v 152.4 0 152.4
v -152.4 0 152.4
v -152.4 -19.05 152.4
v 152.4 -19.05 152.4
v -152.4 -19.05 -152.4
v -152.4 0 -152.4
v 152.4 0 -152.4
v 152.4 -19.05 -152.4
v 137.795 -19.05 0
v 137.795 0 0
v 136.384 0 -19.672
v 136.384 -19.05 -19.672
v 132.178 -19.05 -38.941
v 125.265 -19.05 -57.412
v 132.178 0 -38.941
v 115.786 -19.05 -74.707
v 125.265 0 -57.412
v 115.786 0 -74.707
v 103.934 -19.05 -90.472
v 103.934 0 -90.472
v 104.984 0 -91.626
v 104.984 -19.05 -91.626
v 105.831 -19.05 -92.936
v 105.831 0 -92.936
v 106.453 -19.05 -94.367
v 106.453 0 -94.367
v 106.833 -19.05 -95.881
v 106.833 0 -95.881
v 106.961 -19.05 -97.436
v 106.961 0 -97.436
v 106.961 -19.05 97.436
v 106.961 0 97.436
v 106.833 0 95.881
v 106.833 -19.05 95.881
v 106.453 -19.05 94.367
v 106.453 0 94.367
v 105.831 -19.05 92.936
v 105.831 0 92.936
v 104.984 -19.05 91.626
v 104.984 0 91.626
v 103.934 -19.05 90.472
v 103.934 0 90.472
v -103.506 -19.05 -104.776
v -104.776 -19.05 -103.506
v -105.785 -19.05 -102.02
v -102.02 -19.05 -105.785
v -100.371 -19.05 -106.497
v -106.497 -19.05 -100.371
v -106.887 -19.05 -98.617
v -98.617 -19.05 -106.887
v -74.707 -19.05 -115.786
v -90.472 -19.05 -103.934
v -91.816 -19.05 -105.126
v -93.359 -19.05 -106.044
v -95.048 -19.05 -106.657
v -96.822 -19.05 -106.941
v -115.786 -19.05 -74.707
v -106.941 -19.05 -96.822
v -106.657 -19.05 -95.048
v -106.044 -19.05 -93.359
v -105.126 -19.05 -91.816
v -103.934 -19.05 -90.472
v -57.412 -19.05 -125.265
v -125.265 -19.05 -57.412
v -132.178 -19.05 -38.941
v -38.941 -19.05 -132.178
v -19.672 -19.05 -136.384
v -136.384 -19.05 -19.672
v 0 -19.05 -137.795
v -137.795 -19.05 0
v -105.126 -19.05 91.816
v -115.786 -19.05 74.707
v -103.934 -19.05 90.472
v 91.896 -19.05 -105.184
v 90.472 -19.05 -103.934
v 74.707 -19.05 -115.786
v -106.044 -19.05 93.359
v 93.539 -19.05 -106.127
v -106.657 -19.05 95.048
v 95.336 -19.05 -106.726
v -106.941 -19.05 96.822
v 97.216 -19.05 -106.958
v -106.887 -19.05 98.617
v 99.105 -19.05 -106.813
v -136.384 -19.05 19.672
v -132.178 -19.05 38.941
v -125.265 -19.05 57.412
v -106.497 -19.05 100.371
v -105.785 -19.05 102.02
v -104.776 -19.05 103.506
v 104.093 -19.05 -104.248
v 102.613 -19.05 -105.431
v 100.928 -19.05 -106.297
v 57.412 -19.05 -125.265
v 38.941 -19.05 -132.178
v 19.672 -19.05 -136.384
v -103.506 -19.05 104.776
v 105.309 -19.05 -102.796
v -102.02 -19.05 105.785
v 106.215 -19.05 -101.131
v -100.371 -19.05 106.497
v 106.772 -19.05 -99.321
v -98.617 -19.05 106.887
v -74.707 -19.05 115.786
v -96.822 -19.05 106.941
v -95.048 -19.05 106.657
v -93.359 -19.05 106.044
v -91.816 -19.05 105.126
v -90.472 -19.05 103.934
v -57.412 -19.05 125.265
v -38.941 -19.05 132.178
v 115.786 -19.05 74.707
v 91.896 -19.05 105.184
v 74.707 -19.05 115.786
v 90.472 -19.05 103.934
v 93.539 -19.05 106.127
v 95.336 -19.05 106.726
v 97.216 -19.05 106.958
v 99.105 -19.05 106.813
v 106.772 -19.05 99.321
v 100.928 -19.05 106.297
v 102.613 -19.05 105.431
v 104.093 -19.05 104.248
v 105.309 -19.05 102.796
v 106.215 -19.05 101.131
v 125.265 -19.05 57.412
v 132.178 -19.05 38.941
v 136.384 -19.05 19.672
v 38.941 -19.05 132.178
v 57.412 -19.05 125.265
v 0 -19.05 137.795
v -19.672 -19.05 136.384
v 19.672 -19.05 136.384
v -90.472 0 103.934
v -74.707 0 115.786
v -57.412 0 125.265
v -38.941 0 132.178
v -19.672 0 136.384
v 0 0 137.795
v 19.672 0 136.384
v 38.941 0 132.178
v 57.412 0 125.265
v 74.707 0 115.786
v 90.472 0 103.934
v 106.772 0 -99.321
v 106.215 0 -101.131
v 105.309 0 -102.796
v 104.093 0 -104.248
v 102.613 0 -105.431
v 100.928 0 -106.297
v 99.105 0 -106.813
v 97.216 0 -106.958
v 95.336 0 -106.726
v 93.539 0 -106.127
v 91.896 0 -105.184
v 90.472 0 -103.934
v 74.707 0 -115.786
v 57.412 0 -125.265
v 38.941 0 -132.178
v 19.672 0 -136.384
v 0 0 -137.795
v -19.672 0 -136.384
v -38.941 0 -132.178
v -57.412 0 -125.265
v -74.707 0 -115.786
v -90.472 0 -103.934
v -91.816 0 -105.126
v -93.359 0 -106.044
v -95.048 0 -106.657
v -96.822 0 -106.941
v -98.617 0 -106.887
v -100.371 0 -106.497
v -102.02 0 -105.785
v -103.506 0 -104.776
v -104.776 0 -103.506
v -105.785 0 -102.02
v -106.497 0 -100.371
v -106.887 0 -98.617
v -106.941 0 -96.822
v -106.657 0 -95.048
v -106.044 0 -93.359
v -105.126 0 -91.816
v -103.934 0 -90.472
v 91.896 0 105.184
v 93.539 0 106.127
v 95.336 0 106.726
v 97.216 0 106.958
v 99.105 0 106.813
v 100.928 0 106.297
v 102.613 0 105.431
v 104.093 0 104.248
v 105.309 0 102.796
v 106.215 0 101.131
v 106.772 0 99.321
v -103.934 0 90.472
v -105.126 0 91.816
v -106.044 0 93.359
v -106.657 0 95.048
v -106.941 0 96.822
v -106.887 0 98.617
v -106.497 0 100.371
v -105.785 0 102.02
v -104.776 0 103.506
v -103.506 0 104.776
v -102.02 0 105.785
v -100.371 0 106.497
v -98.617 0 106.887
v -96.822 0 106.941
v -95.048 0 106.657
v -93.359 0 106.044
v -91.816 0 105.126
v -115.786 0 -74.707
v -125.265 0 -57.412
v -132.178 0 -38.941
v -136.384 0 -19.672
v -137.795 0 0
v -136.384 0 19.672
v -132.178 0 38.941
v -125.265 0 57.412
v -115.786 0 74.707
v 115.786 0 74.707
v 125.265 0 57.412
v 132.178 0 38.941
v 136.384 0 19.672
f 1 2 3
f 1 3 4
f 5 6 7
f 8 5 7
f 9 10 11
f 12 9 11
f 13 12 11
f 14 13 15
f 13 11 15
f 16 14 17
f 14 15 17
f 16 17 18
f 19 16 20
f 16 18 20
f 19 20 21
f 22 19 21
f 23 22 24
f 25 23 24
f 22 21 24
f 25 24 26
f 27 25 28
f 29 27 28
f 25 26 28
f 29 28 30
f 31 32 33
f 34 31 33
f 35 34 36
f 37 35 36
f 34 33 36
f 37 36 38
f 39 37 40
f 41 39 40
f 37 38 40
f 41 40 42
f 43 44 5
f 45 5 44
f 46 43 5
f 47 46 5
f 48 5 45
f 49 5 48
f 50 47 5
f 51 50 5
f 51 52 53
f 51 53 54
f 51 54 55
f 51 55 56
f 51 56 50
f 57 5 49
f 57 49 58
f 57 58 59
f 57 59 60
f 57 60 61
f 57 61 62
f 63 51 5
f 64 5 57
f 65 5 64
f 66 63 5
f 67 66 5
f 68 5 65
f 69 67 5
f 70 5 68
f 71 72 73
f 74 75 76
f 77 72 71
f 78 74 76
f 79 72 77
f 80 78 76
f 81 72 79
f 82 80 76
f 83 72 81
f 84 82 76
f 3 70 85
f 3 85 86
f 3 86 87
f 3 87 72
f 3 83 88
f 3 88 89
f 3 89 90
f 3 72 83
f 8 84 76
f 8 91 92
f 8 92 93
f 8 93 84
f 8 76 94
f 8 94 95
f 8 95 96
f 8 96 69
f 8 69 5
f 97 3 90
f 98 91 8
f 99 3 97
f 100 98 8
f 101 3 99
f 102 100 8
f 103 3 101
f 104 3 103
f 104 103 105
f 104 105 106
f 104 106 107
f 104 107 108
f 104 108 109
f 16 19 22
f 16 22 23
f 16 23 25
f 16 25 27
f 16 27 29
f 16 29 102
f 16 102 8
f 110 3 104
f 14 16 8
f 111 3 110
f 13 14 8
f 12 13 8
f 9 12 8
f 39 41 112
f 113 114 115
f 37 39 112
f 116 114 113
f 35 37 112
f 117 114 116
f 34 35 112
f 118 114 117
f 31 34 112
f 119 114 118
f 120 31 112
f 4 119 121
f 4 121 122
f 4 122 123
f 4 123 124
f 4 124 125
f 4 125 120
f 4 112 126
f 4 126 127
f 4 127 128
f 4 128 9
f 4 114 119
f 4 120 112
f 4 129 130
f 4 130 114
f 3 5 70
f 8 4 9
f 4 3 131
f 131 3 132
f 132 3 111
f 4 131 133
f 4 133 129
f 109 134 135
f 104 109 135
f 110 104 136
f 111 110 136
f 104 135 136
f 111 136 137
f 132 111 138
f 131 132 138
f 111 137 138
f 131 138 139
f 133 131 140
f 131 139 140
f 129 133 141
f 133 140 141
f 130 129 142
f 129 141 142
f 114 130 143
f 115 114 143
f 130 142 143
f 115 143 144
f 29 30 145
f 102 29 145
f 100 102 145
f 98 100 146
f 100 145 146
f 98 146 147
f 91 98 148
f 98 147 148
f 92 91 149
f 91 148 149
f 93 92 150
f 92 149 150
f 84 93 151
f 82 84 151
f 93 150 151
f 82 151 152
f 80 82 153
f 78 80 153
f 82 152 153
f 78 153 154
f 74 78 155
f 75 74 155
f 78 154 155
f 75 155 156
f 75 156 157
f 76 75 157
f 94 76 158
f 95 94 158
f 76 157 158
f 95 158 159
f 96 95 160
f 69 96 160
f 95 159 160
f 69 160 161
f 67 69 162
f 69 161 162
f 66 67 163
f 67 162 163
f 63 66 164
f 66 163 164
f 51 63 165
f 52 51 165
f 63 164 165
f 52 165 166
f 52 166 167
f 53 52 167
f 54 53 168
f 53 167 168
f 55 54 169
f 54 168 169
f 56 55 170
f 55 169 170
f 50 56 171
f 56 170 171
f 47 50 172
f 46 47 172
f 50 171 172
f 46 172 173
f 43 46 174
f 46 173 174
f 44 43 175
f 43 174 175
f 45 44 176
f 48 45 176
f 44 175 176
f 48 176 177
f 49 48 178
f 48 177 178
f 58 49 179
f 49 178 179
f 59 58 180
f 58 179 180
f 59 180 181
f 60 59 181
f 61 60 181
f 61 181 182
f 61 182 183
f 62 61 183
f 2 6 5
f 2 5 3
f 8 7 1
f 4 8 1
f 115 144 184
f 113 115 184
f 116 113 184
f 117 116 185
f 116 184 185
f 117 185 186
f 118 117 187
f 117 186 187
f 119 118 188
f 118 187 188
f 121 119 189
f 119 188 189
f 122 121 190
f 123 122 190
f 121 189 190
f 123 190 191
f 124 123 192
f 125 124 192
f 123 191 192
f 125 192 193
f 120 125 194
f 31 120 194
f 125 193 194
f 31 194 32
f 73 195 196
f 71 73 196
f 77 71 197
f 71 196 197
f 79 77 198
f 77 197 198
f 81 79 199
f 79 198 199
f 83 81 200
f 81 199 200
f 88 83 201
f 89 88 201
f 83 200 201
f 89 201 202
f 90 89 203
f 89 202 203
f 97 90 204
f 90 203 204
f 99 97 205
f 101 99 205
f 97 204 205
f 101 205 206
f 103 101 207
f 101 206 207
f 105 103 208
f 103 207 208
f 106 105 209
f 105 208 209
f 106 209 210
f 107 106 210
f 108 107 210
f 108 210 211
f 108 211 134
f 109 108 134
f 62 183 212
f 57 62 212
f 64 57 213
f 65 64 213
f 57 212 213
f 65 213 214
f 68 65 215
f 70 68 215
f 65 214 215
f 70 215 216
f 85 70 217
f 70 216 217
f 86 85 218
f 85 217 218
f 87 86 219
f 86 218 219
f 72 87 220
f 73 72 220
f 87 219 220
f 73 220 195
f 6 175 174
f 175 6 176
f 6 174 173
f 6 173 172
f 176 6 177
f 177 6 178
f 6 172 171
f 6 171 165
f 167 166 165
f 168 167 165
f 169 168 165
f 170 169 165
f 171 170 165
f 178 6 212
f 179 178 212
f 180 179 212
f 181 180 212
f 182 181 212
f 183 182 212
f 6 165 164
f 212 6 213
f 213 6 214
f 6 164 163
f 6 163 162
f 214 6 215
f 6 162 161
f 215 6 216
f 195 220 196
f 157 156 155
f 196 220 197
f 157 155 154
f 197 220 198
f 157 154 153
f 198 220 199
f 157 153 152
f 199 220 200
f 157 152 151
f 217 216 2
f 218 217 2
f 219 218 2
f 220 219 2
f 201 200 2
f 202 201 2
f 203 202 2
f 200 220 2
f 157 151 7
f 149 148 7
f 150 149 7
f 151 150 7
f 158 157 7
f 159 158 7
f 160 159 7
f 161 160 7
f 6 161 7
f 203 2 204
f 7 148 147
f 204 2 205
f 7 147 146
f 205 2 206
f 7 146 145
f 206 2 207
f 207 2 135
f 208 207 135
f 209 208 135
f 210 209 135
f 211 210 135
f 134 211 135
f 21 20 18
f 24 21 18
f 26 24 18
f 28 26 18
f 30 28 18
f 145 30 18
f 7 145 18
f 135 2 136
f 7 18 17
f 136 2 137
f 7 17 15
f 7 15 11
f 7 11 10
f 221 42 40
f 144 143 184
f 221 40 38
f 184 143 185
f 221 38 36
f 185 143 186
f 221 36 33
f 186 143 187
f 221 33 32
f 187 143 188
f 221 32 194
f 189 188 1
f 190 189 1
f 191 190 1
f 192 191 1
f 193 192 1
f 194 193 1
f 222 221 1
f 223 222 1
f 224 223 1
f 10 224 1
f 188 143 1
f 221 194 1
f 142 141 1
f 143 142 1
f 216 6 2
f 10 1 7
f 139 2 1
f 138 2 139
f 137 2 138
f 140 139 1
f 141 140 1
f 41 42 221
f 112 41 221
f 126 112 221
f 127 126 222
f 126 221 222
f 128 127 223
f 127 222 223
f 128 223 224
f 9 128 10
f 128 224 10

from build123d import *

# Parameters (mm, degrees)
F0_W     = 304.8
F0_H     = 304.8
F1_DEPTH = 19.05


with BuildPart() as f1:
    # F0 (on Front) → F1 (new body)
    with BuildSketch(Plane.XZ):
        Rectangle(F0_W, F0_H)
        with BuildLine():
            ThreePointArc((103.934164, 90.471828), (129.052451, 48.300383), (137.795, 0))
            ThreePointArc((137.795, 0), (129.052451, -48.300383), (103.934164, -90.471828))
            ThreePointArc((103.934164, -90.471828), (106.171417, -93.639168), (106.960779, -97.435779))
            ThreePointArc((106.960779, -97.435779), (100.928198, -106.297417), (90.471828, -103.934164))
            ThreePointArc((90.471828, -103.934164), (0, -137.795), (-90.471828, -103.934164))
            ThreePointArc((-90.471828, -103.934164), (-104.170971, -104.170971), (-103.934164, -90.471828))
            ThreePointArc((-103.934164, -90.471828), (-137.795, 0), (-103.934164, 90.471828))
            ThreePointArc((-103.934164, 90.471828), (-104.170971, 104.170971), (-90.471828, 103.934164))
            ThreePointArc((-90.471828, 103.934164), (0, 137.795), (90.471828, 103.934164))
            ThreePointArc((90.471828, 103.934164), (100.928198, 106.297417), (106.960779, 97.435779))
            ThreePointArc((106.960779, 97.435779), (106.171417, 93.639168), (103.934164, 90.471828))
        make_face(mode=Mode.SUBTRACT)
    extrude(amount=F1_DEPTH)


solid = f1.part
